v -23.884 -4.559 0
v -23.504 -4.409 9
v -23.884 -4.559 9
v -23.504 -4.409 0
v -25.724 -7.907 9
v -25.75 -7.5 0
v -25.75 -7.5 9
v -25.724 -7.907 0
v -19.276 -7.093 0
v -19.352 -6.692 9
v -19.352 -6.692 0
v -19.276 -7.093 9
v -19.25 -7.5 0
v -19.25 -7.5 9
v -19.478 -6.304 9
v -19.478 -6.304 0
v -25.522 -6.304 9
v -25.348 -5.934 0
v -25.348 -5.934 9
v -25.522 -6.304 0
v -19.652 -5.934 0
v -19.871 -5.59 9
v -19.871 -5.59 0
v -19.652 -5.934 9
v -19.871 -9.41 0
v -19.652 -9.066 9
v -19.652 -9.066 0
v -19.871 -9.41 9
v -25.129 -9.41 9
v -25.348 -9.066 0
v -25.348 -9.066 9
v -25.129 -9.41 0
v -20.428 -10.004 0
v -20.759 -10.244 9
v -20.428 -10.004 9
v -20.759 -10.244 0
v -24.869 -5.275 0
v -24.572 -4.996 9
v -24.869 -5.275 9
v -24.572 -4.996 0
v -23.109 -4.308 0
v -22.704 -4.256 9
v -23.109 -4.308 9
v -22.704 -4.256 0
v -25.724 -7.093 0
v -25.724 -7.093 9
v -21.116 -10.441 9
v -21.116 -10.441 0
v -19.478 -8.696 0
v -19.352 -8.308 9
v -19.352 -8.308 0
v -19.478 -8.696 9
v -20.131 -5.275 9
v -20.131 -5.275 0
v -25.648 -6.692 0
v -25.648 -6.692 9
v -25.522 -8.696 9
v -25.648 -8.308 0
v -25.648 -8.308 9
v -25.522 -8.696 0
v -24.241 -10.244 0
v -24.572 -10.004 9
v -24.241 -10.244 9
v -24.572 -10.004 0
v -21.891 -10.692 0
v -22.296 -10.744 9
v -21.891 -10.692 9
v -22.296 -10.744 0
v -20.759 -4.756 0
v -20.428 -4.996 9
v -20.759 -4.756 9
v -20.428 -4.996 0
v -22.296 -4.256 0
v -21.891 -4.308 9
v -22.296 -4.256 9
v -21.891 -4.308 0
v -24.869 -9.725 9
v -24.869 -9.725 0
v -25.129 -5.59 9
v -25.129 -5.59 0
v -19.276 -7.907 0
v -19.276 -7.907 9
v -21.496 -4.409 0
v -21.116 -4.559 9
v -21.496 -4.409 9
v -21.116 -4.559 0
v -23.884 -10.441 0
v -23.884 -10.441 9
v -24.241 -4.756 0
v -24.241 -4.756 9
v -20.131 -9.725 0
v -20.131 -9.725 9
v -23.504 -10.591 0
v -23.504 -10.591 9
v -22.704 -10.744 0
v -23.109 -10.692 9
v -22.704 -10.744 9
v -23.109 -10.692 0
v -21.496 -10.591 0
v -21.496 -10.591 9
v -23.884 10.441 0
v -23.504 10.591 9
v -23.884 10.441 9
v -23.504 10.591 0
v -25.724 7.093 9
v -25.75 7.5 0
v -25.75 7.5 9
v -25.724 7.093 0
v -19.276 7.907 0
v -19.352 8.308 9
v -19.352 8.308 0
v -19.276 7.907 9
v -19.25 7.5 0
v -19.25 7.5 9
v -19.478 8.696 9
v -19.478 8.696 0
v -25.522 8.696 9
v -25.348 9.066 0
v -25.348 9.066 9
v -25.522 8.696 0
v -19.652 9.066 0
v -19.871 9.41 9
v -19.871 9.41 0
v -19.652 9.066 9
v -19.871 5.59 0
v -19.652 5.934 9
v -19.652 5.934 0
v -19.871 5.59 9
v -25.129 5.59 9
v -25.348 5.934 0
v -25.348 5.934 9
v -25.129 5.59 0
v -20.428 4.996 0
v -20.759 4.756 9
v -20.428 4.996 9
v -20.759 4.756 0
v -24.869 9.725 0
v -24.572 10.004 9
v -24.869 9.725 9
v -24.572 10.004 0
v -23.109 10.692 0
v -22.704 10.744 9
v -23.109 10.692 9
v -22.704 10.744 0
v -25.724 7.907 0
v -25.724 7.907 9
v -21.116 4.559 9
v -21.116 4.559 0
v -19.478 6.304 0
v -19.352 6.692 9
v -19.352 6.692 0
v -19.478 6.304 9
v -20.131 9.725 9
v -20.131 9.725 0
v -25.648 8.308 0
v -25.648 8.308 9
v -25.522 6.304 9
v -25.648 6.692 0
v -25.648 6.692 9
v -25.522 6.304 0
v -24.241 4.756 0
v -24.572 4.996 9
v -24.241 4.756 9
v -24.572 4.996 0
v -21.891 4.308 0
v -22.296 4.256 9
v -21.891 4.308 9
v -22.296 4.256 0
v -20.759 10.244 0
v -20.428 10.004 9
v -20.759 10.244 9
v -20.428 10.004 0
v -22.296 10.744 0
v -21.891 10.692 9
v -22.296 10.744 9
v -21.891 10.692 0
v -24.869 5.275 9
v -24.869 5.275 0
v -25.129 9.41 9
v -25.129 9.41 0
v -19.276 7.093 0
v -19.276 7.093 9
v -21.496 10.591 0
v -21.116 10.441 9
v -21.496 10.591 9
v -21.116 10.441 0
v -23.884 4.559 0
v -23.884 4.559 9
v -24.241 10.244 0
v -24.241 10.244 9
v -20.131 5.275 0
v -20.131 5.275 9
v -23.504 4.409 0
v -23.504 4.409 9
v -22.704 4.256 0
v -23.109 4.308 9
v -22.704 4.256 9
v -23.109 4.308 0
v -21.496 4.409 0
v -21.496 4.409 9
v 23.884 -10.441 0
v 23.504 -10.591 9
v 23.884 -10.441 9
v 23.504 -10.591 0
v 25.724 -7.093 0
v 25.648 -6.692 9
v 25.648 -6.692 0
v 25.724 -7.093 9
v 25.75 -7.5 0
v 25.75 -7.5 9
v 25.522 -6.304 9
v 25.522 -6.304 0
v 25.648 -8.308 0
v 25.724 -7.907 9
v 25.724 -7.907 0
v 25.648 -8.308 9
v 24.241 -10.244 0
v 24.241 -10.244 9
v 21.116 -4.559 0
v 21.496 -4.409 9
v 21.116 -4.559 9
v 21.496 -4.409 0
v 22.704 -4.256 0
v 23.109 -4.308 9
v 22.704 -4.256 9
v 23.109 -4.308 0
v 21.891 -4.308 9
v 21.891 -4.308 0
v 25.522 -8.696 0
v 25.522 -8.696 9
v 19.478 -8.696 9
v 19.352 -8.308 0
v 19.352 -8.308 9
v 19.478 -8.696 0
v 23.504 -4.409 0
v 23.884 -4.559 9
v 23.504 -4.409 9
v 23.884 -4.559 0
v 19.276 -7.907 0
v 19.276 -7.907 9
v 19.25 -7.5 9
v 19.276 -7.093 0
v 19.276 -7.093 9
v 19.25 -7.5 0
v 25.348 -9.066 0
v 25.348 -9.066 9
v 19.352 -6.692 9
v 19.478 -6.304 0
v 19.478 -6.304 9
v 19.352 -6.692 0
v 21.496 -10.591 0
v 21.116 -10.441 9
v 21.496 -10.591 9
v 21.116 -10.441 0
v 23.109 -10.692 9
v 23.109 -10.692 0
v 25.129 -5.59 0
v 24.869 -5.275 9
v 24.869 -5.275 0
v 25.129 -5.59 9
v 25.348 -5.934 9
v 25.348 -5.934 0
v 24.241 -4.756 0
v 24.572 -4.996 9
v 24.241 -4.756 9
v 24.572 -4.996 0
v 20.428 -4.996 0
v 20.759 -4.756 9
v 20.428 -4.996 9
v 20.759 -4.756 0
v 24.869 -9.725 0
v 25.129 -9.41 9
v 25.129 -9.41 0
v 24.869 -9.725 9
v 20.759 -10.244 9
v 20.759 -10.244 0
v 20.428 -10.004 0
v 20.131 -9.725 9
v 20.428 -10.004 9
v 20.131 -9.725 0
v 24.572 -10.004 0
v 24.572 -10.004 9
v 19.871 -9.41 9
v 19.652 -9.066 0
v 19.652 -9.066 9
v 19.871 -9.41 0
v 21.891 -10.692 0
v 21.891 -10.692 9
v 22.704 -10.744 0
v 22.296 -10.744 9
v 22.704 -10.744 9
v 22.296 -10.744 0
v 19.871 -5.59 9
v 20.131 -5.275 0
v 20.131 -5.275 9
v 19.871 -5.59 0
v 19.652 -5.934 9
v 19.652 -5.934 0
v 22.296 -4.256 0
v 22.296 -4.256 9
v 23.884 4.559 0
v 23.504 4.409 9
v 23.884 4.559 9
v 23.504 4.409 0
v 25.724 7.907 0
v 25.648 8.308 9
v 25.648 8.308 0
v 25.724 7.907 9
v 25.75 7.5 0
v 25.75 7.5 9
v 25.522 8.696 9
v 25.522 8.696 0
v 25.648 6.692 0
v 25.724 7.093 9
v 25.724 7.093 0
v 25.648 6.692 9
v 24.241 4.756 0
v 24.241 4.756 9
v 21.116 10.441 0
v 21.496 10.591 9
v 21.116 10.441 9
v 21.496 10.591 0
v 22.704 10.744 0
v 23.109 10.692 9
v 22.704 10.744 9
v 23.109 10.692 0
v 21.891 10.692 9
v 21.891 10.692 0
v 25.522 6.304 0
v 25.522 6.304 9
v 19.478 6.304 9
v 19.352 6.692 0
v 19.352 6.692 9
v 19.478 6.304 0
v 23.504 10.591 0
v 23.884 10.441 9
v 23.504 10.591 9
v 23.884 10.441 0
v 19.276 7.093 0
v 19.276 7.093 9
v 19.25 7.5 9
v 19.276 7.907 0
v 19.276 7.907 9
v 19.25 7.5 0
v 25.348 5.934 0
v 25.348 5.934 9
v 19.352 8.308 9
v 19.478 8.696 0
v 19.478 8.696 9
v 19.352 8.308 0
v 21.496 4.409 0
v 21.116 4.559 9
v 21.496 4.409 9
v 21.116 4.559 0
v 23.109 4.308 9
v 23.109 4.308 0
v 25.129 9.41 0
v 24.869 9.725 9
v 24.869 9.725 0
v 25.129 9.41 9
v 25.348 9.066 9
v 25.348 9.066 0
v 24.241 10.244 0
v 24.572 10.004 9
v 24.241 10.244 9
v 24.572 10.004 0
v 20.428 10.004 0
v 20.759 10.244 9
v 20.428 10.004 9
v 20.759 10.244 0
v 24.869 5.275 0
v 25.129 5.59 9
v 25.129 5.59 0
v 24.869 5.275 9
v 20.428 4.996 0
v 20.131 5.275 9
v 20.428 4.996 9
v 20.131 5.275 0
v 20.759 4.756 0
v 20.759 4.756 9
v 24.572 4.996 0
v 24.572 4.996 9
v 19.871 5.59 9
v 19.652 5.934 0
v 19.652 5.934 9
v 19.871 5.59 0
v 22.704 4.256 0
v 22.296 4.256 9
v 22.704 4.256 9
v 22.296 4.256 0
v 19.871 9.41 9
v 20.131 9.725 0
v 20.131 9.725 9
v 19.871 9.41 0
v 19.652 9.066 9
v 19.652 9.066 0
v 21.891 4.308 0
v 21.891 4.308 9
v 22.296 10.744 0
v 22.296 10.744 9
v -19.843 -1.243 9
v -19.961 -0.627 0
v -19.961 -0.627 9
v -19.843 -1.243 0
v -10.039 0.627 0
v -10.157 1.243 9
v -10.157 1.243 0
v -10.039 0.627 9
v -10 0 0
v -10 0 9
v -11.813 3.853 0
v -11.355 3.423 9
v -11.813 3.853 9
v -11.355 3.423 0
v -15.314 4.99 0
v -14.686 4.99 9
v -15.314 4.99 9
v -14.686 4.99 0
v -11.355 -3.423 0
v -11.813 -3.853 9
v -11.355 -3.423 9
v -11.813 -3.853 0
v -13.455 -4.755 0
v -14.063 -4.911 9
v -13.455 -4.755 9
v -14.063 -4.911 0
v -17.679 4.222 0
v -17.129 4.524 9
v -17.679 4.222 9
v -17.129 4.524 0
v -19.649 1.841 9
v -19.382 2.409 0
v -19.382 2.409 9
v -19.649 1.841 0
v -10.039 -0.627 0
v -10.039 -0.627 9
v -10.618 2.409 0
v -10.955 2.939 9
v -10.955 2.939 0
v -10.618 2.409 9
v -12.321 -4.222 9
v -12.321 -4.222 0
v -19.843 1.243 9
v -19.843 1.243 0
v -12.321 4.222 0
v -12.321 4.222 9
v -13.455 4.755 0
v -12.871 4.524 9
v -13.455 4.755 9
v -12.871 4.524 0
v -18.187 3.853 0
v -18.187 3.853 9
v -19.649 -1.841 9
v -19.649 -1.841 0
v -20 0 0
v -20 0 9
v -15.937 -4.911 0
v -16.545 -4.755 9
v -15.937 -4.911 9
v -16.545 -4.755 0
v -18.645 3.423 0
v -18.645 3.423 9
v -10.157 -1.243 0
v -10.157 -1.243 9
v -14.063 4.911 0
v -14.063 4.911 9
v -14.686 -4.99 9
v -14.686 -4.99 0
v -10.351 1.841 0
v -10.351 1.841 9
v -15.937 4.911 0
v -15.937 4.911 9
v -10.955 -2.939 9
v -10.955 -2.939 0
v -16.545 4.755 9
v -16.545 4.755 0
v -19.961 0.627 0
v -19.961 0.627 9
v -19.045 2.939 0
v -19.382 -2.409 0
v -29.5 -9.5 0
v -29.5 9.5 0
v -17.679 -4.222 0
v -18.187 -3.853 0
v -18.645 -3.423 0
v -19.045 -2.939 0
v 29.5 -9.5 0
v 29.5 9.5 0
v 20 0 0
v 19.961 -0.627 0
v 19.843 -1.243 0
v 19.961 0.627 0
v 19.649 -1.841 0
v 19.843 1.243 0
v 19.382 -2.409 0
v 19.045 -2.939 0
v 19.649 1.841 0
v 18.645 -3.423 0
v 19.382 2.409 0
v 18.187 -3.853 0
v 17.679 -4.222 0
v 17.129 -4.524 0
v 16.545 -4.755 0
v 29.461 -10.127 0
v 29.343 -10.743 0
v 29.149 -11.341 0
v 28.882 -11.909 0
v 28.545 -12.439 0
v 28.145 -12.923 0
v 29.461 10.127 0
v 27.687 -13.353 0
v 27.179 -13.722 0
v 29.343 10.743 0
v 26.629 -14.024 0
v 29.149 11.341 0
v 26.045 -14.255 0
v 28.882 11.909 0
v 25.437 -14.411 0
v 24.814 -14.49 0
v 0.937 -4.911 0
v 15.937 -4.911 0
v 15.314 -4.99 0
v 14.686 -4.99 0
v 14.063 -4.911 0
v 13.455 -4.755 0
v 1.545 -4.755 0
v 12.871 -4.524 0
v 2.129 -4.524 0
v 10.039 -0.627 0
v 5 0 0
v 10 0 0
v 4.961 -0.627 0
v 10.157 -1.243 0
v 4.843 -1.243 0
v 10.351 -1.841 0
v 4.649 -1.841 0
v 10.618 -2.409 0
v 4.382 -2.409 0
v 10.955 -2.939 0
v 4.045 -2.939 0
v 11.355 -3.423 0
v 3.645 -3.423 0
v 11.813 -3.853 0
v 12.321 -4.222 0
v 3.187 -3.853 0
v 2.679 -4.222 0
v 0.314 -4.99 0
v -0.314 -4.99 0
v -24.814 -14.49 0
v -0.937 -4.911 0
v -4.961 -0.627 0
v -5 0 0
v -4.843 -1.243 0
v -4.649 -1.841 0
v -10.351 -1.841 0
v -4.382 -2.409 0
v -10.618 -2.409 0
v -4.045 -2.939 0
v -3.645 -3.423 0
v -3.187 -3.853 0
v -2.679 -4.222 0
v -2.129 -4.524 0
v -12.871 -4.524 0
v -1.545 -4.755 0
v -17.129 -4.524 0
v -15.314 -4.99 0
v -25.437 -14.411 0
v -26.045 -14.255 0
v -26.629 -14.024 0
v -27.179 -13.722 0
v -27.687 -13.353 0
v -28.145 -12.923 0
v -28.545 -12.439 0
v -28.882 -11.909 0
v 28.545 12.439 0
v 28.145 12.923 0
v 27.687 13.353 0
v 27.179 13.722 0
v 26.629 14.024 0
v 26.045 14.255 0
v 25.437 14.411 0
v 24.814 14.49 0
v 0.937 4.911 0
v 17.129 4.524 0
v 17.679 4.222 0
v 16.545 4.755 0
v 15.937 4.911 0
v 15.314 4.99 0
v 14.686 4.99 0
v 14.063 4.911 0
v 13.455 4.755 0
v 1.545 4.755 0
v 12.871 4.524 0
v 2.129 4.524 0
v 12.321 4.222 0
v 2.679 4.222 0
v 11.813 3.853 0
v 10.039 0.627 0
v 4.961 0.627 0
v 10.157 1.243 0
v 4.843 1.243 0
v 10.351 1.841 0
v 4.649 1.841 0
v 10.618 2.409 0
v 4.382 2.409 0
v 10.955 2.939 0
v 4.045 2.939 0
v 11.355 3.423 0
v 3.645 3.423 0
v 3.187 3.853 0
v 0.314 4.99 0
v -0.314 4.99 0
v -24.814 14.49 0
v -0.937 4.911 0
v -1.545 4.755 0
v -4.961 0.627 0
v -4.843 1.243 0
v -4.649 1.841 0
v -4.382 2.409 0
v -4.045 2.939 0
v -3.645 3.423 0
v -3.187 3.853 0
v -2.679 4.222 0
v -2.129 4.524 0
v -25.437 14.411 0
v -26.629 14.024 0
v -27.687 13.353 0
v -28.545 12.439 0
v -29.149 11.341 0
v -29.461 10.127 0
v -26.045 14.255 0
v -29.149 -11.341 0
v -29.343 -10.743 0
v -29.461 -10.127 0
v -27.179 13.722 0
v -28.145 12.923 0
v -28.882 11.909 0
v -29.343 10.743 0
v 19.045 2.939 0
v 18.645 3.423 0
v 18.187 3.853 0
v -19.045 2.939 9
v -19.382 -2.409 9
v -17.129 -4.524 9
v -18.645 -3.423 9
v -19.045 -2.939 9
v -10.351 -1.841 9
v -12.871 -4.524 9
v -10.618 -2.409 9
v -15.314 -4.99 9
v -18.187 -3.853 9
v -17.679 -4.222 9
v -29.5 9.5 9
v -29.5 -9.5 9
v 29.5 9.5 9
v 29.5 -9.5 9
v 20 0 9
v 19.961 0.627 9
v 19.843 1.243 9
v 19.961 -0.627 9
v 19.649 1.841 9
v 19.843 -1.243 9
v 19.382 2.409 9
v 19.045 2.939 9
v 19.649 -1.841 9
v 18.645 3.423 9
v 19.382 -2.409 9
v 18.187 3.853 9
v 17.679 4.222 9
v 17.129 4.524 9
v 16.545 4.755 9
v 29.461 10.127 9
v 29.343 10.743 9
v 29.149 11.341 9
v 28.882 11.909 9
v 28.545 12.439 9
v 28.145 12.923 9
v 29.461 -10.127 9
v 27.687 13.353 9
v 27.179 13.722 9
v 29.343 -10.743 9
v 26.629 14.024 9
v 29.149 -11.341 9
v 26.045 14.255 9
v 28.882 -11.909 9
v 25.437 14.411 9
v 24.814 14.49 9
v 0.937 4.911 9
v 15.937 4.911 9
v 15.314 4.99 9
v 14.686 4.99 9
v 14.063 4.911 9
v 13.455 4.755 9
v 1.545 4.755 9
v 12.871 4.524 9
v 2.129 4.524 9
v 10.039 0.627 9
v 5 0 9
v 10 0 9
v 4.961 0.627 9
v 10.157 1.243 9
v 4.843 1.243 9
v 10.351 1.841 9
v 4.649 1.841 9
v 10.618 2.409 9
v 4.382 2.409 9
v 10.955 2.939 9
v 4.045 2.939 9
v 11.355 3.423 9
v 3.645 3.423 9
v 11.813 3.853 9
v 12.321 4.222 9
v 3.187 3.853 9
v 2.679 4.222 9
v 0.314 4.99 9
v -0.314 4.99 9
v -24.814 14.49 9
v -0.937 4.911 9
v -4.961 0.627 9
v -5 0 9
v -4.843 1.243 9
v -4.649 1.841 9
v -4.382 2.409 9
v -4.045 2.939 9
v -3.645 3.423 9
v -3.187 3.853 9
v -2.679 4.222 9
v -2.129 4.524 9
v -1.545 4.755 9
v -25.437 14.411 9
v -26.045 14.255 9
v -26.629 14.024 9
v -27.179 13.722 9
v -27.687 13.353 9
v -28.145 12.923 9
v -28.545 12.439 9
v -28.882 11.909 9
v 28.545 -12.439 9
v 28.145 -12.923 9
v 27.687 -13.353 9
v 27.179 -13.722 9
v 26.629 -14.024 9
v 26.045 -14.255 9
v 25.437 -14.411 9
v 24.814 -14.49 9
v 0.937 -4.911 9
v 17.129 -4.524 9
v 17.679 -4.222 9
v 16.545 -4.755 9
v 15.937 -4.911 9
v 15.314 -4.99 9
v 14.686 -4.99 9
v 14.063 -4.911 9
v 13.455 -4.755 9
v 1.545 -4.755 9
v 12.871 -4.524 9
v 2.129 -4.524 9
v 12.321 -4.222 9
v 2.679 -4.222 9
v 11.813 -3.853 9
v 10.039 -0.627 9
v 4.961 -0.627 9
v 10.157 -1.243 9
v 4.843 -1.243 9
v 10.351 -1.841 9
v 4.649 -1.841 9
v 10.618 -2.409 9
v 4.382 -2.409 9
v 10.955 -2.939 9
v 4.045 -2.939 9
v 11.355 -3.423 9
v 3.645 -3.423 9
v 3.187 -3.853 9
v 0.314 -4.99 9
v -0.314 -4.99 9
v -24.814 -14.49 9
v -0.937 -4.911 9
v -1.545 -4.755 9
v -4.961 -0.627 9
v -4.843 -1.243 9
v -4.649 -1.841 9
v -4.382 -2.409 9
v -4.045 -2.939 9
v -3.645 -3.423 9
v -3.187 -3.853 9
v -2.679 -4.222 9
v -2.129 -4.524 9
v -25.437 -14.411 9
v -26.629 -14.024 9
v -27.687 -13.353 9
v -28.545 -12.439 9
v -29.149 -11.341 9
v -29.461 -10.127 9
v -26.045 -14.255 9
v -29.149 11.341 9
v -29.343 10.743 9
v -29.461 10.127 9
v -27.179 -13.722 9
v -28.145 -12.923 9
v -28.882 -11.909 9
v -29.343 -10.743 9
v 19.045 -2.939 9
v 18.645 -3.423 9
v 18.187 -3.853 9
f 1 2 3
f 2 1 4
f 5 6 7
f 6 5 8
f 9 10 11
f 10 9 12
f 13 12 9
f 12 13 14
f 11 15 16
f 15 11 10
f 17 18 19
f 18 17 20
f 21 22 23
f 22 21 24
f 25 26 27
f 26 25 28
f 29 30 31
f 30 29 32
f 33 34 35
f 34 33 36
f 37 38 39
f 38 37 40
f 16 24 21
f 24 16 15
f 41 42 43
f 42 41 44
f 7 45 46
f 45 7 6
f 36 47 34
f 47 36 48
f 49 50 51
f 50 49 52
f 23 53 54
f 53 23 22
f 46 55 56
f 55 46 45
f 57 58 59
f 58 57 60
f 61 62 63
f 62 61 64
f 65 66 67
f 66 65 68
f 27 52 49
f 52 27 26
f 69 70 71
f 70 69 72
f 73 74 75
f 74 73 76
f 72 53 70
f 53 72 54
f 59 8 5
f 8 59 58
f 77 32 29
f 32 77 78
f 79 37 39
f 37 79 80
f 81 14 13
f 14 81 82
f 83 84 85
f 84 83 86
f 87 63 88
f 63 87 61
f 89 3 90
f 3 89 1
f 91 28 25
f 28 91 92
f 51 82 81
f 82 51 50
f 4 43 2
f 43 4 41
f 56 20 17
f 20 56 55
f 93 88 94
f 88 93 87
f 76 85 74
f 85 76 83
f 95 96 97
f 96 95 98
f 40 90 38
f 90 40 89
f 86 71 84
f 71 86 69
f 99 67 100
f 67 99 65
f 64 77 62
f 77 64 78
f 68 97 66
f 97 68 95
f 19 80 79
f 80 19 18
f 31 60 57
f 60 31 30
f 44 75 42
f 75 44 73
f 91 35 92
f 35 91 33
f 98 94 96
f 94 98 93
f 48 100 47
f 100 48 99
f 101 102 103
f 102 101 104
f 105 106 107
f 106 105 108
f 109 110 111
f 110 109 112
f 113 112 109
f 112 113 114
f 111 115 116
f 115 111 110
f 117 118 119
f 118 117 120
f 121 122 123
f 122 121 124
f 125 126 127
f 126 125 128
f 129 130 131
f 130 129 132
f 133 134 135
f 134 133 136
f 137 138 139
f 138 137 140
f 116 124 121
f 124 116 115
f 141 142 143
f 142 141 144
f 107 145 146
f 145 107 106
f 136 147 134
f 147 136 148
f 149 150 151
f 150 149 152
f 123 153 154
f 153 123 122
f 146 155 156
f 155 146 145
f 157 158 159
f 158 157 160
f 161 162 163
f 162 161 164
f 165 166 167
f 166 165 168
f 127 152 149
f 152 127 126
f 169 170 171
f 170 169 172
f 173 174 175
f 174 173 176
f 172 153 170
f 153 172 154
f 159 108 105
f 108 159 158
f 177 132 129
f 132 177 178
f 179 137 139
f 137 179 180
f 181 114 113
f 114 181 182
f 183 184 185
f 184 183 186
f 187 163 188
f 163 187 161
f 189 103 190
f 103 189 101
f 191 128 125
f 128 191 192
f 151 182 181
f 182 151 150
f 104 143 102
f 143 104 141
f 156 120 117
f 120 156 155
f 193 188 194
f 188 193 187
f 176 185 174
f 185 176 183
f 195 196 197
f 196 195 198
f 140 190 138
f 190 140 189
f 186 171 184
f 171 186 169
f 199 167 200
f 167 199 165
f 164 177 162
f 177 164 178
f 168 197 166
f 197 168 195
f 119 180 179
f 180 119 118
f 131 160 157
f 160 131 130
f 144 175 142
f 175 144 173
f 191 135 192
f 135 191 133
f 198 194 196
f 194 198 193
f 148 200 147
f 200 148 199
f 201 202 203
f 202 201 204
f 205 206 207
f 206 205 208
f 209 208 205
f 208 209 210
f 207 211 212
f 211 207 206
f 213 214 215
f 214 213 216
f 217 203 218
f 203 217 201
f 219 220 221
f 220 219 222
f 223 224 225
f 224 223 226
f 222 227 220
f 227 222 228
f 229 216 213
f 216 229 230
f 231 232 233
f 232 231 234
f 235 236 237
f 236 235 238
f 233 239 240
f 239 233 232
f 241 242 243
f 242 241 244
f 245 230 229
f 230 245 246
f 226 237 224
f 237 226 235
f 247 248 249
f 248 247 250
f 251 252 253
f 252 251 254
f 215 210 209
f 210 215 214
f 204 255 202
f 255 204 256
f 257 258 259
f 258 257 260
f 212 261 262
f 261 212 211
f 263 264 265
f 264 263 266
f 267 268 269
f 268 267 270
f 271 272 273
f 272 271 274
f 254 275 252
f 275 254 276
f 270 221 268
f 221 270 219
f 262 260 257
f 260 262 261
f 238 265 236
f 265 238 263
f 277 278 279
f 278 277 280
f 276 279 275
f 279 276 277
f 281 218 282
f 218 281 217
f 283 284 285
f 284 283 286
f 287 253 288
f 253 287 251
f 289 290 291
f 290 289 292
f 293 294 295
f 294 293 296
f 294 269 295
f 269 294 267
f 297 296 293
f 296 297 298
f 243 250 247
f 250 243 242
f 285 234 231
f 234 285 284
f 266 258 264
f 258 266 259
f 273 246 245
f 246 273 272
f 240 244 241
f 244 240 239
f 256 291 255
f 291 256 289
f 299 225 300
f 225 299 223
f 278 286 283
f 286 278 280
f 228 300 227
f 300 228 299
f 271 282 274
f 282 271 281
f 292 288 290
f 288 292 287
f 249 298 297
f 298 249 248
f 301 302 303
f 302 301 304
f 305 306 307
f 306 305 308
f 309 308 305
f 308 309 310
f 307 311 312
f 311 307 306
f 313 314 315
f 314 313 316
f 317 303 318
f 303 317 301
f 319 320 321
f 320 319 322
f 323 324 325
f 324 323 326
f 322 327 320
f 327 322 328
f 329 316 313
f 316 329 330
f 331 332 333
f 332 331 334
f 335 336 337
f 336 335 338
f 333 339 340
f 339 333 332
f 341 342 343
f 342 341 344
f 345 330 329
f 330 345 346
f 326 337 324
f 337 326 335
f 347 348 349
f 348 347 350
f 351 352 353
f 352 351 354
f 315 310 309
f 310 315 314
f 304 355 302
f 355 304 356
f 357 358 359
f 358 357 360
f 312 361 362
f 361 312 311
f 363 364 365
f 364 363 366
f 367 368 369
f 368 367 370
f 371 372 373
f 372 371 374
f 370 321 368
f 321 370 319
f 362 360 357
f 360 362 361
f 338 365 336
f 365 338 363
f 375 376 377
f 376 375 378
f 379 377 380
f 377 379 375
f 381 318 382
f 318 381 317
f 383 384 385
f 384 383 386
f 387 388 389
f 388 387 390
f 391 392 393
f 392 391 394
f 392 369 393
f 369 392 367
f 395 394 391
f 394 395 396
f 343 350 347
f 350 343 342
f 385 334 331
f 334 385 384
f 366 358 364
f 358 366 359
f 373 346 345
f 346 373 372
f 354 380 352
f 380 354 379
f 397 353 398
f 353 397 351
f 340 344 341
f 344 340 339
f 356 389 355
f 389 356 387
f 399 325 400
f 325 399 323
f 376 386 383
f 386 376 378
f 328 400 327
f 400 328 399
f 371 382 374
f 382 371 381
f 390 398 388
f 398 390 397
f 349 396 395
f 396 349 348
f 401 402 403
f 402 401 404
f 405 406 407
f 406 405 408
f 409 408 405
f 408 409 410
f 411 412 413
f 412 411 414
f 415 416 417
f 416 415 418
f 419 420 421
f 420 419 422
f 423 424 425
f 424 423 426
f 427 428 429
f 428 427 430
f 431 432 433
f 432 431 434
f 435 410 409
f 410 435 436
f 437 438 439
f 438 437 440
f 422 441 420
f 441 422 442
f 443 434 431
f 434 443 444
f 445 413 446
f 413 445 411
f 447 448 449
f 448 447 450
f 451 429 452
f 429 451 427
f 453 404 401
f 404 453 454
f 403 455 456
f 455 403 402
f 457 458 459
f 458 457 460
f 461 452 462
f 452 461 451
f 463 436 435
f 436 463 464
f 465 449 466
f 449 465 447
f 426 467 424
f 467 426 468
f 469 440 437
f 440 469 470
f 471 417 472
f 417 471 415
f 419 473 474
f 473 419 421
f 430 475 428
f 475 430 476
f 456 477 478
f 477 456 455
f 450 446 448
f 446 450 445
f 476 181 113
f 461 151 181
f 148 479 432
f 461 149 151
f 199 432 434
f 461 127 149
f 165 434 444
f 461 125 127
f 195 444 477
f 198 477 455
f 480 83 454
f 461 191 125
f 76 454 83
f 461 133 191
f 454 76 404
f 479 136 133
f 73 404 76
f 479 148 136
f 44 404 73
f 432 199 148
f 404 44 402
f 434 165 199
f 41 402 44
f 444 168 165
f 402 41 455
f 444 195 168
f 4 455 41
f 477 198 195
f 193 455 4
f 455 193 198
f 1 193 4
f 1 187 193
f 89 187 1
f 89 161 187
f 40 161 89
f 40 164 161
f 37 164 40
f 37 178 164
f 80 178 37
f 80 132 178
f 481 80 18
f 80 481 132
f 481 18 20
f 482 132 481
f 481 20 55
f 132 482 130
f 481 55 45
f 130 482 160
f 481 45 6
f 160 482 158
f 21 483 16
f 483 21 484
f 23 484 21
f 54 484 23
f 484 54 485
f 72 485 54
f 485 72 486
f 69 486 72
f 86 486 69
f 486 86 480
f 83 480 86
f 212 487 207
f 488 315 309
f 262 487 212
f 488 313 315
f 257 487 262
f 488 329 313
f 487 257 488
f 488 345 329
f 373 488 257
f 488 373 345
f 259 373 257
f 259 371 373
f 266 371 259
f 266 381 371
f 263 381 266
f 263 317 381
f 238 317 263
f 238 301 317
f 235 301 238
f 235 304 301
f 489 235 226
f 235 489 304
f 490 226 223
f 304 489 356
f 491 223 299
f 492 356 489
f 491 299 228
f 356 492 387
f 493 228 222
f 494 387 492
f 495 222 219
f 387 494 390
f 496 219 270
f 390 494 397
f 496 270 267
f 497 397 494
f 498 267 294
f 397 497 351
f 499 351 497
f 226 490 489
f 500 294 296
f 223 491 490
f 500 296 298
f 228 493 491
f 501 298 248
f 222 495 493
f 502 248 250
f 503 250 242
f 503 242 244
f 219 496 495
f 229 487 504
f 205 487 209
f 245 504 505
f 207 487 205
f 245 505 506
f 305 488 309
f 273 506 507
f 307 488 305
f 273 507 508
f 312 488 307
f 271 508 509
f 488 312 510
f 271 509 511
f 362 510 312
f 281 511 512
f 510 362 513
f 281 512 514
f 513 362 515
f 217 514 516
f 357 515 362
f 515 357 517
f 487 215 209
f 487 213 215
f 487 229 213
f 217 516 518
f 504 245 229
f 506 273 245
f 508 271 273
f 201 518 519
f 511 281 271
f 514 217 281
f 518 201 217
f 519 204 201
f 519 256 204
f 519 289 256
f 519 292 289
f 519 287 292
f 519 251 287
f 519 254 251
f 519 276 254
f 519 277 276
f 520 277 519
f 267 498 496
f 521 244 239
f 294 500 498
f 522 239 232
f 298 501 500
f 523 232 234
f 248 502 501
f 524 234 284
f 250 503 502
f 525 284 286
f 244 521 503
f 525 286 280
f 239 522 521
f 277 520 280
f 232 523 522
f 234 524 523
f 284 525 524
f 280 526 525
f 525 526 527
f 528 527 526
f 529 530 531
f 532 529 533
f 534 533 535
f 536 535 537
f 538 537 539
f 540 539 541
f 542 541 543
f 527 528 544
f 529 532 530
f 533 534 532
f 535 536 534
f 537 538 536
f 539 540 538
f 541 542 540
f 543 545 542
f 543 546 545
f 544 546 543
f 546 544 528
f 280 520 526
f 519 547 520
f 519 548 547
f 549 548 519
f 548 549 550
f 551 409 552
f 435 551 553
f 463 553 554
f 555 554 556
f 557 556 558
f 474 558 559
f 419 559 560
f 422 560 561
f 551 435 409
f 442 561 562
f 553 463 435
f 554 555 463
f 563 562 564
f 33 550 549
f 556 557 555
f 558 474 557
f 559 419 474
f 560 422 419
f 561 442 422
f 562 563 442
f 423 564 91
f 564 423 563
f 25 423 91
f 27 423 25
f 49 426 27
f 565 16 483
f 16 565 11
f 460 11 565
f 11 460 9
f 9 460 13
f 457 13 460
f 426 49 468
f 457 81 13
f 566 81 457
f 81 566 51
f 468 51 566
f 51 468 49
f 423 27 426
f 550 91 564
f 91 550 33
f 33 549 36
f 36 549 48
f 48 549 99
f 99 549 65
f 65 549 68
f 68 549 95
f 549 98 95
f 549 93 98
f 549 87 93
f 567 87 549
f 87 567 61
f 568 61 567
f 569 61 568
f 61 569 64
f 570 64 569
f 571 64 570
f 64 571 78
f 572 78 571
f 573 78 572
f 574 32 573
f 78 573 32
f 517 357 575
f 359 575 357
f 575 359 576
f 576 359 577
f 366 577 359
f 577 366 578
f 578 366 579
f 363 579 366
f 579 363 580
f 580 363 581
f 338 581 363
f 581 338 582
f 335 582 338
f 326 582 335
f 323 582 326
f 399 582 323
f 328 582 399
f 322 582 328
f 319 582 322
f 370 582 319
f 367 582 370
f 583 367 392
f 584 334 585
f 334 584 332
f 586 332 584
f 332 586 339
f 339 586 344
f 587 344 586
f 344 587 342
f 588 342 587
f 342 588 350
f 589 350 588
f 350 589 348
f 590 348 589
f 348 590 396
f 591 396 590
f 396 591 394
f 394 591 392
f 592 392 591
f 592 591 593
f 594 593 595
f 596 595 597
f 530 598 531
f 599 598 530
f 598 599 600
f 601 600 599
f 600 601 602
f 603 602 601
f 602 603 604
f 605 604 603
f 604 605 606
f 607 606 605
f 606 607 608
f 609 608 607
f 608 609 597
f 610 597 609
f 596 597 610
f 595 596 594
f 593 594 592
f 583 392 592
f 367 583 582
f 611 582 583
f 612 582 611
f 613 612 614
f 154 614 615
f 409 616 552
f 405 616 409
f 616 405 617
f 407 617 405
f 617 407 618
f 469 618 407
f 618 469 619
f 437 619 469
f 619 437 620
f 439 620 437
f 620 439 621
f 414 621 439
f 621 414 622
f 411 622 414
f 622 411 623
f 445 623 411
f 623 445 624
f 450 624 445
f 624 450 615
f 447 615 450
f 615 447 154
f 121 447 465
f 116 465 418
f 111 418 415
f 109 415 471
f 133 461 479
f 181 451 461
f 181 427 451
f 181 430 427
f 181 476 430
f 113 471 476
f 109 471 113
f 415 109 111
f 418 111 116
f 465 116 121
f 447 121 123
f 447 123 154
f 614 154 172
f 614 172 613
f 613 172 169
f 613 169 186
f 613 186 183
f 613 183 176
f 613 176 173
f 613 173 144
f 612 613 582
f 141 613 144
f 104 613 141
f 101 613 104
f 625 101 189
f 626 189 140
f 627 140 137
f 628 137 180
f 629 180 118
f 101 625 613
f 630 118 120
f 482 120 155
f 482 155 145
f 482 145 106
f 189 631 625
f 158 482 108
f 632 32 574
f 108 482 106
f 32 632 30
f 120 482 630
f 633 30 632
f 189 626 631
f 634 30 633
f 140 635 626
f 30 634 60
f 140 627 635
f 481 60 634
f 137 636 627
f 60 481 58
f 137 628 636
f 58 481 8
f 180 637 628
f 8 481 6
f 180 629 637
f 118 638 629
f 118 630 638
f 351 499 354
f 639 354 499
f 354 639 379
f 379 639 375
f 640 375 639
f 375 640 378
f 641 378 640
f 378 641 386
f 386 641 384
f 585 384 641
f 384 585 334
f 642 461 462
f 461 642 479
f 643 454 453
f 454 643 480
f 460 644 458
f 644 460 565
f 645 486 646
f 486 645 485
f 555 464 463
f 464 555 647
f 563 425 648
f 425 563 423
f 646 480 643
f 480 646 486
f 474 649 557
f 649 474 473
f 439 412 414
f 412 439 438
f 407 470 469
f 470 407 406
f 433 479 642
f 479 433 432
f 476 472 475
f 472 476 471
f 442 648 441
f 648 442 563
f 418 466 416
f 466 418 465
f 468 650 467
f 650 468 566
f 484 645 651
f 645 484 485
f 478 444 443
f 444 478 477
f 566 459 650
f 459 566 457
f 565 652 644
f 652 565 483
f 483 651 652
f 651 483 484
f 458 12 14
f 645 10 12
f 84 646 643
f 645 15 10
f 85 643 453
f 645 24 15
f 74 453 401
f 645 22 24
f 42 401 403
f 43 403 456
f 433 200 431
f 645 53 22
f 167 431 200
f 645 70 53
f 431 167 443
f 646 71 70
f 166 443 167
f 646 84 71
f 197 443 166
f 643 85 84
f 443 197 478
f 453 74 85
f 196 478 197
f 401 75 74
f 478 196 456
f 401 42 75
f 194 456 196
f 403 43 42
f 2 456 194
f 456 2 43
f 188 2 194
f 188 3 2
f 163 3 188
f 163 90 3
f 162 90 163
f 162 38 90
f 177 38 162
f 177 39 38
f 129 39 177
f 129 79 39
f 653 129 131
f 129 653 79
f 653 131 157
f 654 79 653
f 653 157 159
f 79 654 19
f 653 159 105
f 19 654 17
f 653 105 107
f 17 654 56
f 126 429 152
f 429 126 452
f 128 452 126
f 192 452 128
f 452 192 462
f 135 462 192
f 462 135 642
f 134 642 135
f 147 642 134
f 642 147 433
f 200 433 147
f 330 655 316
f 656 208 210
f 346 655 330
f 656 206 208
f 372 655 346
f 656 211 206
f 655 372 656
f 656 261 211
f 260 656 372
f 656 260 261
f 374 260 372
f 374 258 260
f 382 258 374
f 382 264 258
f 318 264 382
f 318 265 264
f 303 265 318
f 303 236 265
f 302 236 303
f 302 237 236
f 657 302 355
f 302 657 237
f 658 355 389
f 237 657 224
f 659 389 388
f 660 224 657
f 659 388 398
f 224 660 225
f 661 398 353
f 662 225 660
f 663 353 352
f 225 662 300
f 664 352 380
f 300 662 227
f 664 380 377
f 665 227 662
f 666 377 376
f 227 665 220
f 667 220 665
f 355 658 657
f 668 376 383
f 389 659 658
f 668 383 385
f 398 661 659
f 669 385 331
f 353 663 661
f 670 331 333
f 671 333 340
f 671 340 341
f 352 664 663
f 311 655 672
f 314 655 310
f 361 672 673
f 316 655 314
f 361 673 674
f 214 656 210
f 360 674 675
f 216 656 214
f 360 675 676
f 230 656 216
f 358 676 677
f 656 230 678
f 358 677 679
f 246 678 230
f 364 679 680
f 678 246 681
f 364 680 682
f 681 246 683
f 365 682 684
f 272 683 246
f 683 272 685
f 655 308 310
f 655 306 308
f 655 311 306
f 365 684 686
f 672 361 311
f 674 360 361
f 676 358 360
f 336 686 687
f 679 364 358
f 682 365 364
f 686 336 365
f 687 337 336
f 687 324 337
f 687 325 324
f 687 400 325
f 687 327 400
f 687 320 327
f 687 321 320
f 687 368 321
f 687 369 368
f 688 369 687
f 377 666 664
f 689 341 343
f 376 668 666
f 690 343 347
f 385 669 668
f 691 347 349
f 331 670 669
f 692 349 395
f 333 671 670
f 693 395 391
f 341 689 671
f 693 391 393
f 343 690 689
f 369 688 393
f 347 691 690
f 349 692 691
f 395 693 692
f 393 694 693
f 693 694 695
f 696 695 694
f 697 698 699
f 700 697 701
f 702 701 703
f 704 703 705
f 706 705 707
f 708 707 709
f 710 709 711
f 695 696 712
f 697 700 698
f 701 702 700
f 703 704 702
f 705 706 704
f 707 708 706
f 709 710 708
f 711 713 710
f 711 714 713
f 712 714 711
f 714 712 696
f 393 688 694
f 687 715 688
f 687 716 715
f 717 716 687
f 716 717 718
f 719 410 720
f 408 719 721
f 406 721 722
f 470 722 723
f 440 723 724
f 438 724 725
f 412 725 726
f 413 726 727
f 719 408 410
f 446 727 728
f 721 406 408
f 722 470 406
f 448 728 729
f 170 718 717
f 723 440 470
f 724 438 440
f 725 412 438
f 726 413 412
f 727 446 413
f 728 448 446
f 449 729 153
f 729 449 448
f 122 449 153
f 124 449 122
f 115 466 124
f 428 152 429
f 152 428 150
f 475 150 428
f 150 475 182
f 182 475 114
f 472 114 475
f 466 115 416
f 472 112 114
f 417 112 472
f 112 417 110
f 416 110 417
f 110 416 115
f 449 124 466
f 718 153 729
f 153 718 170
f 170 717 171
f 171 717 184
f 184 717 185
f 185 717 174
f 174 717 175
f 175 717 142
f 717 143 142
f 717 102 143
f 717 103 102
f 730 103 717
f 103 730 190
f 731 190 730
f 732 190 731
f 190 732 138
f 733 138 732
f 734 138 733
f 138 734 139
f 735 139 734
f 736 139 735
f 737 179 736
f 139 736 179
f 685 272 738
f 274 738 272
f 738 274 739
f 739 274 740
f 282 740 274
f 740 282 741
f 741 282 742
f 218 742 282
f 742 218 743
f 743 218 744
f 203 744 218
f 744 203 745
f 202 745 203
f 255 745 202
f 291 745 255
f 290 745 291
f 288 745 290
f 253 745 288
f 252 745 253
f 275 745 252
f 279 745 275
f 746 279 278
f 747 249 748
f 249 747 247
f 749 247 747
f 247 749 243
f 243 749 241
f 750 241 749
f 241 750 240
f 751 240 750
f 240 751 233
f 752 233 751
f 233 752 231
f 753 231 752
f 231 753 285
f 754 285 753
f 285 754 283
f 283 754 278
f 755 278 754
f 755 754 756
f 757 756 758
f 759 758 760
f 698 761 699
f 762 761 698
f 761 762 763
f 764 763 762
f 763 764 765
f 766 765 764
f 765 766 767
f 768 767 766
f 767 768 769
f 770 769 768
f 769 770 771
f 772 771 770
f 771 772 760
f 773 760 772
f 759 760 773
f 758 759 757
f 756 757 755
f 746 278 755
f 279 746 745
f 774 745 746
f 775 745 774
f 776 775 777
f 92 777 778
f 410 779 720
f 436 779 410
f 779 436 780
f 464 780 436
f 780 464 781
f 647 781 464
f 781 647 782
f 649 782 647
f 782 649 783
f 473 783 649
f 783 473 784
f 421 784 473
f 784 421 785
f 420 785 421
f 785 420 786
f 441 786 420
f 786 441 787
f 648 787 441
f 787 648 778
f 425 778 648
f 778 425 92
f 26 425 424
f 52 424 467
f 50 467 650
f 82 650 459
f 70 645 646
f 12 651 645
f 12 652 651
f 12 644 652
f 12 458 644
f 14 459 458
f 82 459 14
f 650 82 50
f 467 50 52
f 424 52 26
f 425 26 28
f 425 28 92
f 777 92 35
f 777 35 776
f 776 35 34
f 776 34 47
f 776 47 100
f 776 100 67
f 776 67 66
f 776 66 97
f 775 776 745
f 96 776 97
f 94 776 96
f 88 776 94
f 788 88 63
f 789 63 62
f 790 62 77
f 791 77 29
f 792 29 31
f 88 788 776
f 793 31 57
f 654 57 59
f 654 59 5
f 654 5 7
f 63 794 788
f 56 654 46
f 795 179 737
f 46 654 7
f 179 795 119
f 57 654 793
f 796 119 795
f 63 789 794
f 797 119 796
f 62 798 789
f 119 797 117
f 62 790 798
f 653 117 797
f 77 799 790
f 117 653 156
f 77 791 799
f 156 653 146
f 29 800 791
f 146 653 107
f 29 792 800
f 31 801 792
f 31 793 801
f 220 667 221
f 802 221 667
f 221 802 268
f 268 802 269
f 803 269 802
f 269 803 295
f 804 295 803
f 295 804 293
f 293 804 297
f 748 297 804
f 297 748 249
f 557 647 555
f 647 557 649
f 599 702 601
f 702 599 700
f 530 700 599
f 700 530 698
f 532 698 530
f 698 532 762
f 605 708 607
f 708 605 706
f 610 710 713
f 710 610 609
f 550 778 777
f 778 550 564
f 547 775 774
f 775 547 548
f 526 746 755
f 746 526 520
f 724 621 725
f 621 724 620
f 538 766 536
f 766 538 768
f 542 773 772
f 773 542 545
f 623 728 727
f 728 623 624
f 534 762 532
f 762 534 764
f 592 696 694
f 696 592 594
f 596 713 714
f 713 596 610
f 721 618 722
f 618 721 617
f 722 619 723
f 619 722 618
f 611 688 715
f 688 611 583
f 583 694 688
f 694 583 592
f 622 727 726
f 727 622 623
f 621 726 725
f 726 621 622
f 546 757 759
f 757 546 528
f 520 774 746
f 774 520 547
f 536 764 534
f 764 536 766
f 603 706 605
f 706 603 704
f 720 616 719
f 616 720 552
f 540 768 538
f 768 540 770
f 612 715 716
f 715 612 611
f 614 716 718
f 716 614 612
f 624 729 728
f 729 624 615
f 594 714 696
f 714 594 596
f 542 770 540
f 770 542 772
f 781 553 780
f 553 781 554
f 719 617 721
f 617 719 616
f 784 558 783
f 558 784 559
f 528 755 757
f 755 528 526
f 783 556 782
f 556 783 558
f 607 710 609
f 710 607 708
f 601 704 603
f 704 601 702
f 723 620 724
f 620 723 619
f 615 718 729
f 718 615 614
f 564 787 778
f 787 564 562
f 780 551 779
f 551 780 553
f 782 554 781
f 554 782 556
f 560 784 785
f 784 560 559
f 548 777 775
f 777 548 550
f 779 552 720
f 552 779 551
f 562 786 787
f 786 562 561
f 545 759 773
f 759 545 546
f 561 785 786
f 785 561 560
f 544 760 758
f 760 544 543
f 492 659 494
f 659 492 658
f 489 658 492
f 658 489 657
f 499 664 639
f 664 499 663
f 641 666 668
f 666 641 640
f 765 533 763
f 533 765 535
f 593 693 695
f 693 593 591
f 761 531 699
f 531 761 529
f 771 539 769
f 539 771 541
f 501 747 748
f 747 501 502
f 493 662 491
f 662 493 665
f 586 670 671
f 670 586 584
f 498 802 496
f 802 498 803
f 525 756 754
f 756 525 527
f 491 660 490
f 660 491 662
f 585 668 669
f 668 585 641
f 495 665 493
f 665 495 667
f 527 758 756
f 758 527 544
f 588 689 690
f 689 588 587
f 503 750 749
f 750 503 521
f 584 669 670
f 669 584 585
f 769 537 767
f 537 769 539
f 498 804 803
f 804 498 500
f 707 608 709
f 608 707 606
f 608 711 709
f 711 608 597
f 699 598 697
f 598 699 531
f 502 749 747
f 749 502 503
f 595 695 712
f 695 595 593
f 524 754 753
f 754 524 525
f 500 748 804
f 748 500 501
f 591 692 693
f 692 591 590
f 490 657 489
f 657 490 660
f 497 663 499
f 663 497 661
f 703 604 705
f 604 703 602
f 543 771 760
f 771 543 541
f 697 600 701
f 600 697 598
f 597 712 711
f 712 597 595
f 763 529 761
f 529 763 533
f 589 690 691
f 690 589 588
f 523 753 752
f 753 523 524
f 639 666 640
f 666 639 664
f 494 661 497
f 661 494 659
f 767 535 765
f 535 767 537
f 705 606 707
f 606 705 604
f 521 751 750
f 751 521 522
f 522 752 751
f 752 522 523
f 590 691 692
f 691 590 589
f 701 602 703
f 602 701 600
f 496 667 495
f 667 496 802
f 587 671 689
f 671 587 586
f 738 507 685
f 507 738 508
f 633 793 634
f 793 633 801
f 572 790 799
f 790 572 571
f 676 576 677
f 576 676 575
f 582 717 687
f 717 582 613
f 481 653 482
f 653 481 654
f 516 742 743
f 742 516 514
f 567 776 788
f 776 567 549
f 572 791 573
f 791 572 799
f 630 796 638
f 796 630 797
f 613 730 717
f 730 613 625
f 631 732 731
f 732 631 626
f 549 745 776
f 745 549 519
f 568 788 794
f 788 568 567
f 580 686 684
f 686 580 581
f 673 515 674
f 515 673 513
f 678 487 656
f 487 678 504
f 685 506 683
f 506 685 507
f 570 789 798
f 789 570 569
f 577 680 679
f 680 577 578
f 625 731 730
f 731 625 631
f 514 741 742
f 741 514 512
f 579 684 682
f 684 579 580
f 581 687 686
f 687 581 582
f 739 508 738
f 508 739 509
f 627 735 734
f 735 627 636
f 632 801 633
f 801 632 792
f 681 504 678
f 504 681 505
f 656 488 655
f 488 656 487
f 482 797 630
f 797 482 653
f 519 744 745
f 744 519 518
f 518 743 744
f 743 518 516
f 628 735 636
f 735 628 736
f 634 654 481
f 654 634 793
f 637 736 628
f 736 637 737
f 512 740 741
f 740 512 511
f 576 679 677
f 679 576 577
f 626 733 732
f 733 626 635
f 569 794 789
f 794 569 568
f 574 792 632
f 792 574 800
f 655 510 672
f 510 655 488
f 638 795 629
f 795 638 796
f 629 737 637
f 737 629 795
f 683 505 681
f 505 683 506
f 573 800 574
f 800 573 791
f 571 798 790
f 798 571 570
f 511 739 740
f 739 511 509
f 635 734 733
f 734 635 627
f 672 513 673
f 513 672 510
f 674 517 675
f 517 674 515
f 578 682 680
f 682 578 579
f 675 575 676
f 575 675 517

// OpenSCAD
$fn = 50;


difference() {
	union() {
		hull() {
			translate(v = [-24.5000000000, 9.5000000000, 0]) {
				cylinder(h = 9, r = 5);
			}
			translate(v = [24.5000000000, 9.5000000000, 0]) {
				cylinder(h = 9, r = 5);
			}
			translate(v = [-24.5000000000, -9.5000000000, 0]) {
				cylinder(h = 9, r = 5);
			}
			translate(v = [24.5000000000, -9.5000000000, 0]) {
				cylinder(h = 9, r = 5);
			}
		}
	}
	union() {
		#translate(v = [-22.5000000000, -7.5000000000, -100.0000000000]) {
			cylinder(h = 200, r = 3.2500000000);
		}
		#translate(v = [-22.5000000000, 7.5000000000, -100.0000000000]) {
			cylinder(h = 200, r = 3.2500000000);
		}
		#translate(v = [22.5000000000, -7.5000000000, -100.0000000000]) {
			cylinder(h = 200, r = 3.2500000000);
		}
		#translate(v = [22.5000000000, 7.5000000000, -100.0000000000]) {
			cylinder(h = 200, r = 3.2500000000);
		}
		#translate(v = [-15.0000000000, 0, 0]) {
			cylinder(h = 9, r = 5.0000000000);
		}
		#cylinder(h = 9, r = 5.0000000000);
		#translate(v = [15.0000000000, 0, 0]) {
			cylinder(h = 9, r = 5.0000000000);
		}
	}
}
